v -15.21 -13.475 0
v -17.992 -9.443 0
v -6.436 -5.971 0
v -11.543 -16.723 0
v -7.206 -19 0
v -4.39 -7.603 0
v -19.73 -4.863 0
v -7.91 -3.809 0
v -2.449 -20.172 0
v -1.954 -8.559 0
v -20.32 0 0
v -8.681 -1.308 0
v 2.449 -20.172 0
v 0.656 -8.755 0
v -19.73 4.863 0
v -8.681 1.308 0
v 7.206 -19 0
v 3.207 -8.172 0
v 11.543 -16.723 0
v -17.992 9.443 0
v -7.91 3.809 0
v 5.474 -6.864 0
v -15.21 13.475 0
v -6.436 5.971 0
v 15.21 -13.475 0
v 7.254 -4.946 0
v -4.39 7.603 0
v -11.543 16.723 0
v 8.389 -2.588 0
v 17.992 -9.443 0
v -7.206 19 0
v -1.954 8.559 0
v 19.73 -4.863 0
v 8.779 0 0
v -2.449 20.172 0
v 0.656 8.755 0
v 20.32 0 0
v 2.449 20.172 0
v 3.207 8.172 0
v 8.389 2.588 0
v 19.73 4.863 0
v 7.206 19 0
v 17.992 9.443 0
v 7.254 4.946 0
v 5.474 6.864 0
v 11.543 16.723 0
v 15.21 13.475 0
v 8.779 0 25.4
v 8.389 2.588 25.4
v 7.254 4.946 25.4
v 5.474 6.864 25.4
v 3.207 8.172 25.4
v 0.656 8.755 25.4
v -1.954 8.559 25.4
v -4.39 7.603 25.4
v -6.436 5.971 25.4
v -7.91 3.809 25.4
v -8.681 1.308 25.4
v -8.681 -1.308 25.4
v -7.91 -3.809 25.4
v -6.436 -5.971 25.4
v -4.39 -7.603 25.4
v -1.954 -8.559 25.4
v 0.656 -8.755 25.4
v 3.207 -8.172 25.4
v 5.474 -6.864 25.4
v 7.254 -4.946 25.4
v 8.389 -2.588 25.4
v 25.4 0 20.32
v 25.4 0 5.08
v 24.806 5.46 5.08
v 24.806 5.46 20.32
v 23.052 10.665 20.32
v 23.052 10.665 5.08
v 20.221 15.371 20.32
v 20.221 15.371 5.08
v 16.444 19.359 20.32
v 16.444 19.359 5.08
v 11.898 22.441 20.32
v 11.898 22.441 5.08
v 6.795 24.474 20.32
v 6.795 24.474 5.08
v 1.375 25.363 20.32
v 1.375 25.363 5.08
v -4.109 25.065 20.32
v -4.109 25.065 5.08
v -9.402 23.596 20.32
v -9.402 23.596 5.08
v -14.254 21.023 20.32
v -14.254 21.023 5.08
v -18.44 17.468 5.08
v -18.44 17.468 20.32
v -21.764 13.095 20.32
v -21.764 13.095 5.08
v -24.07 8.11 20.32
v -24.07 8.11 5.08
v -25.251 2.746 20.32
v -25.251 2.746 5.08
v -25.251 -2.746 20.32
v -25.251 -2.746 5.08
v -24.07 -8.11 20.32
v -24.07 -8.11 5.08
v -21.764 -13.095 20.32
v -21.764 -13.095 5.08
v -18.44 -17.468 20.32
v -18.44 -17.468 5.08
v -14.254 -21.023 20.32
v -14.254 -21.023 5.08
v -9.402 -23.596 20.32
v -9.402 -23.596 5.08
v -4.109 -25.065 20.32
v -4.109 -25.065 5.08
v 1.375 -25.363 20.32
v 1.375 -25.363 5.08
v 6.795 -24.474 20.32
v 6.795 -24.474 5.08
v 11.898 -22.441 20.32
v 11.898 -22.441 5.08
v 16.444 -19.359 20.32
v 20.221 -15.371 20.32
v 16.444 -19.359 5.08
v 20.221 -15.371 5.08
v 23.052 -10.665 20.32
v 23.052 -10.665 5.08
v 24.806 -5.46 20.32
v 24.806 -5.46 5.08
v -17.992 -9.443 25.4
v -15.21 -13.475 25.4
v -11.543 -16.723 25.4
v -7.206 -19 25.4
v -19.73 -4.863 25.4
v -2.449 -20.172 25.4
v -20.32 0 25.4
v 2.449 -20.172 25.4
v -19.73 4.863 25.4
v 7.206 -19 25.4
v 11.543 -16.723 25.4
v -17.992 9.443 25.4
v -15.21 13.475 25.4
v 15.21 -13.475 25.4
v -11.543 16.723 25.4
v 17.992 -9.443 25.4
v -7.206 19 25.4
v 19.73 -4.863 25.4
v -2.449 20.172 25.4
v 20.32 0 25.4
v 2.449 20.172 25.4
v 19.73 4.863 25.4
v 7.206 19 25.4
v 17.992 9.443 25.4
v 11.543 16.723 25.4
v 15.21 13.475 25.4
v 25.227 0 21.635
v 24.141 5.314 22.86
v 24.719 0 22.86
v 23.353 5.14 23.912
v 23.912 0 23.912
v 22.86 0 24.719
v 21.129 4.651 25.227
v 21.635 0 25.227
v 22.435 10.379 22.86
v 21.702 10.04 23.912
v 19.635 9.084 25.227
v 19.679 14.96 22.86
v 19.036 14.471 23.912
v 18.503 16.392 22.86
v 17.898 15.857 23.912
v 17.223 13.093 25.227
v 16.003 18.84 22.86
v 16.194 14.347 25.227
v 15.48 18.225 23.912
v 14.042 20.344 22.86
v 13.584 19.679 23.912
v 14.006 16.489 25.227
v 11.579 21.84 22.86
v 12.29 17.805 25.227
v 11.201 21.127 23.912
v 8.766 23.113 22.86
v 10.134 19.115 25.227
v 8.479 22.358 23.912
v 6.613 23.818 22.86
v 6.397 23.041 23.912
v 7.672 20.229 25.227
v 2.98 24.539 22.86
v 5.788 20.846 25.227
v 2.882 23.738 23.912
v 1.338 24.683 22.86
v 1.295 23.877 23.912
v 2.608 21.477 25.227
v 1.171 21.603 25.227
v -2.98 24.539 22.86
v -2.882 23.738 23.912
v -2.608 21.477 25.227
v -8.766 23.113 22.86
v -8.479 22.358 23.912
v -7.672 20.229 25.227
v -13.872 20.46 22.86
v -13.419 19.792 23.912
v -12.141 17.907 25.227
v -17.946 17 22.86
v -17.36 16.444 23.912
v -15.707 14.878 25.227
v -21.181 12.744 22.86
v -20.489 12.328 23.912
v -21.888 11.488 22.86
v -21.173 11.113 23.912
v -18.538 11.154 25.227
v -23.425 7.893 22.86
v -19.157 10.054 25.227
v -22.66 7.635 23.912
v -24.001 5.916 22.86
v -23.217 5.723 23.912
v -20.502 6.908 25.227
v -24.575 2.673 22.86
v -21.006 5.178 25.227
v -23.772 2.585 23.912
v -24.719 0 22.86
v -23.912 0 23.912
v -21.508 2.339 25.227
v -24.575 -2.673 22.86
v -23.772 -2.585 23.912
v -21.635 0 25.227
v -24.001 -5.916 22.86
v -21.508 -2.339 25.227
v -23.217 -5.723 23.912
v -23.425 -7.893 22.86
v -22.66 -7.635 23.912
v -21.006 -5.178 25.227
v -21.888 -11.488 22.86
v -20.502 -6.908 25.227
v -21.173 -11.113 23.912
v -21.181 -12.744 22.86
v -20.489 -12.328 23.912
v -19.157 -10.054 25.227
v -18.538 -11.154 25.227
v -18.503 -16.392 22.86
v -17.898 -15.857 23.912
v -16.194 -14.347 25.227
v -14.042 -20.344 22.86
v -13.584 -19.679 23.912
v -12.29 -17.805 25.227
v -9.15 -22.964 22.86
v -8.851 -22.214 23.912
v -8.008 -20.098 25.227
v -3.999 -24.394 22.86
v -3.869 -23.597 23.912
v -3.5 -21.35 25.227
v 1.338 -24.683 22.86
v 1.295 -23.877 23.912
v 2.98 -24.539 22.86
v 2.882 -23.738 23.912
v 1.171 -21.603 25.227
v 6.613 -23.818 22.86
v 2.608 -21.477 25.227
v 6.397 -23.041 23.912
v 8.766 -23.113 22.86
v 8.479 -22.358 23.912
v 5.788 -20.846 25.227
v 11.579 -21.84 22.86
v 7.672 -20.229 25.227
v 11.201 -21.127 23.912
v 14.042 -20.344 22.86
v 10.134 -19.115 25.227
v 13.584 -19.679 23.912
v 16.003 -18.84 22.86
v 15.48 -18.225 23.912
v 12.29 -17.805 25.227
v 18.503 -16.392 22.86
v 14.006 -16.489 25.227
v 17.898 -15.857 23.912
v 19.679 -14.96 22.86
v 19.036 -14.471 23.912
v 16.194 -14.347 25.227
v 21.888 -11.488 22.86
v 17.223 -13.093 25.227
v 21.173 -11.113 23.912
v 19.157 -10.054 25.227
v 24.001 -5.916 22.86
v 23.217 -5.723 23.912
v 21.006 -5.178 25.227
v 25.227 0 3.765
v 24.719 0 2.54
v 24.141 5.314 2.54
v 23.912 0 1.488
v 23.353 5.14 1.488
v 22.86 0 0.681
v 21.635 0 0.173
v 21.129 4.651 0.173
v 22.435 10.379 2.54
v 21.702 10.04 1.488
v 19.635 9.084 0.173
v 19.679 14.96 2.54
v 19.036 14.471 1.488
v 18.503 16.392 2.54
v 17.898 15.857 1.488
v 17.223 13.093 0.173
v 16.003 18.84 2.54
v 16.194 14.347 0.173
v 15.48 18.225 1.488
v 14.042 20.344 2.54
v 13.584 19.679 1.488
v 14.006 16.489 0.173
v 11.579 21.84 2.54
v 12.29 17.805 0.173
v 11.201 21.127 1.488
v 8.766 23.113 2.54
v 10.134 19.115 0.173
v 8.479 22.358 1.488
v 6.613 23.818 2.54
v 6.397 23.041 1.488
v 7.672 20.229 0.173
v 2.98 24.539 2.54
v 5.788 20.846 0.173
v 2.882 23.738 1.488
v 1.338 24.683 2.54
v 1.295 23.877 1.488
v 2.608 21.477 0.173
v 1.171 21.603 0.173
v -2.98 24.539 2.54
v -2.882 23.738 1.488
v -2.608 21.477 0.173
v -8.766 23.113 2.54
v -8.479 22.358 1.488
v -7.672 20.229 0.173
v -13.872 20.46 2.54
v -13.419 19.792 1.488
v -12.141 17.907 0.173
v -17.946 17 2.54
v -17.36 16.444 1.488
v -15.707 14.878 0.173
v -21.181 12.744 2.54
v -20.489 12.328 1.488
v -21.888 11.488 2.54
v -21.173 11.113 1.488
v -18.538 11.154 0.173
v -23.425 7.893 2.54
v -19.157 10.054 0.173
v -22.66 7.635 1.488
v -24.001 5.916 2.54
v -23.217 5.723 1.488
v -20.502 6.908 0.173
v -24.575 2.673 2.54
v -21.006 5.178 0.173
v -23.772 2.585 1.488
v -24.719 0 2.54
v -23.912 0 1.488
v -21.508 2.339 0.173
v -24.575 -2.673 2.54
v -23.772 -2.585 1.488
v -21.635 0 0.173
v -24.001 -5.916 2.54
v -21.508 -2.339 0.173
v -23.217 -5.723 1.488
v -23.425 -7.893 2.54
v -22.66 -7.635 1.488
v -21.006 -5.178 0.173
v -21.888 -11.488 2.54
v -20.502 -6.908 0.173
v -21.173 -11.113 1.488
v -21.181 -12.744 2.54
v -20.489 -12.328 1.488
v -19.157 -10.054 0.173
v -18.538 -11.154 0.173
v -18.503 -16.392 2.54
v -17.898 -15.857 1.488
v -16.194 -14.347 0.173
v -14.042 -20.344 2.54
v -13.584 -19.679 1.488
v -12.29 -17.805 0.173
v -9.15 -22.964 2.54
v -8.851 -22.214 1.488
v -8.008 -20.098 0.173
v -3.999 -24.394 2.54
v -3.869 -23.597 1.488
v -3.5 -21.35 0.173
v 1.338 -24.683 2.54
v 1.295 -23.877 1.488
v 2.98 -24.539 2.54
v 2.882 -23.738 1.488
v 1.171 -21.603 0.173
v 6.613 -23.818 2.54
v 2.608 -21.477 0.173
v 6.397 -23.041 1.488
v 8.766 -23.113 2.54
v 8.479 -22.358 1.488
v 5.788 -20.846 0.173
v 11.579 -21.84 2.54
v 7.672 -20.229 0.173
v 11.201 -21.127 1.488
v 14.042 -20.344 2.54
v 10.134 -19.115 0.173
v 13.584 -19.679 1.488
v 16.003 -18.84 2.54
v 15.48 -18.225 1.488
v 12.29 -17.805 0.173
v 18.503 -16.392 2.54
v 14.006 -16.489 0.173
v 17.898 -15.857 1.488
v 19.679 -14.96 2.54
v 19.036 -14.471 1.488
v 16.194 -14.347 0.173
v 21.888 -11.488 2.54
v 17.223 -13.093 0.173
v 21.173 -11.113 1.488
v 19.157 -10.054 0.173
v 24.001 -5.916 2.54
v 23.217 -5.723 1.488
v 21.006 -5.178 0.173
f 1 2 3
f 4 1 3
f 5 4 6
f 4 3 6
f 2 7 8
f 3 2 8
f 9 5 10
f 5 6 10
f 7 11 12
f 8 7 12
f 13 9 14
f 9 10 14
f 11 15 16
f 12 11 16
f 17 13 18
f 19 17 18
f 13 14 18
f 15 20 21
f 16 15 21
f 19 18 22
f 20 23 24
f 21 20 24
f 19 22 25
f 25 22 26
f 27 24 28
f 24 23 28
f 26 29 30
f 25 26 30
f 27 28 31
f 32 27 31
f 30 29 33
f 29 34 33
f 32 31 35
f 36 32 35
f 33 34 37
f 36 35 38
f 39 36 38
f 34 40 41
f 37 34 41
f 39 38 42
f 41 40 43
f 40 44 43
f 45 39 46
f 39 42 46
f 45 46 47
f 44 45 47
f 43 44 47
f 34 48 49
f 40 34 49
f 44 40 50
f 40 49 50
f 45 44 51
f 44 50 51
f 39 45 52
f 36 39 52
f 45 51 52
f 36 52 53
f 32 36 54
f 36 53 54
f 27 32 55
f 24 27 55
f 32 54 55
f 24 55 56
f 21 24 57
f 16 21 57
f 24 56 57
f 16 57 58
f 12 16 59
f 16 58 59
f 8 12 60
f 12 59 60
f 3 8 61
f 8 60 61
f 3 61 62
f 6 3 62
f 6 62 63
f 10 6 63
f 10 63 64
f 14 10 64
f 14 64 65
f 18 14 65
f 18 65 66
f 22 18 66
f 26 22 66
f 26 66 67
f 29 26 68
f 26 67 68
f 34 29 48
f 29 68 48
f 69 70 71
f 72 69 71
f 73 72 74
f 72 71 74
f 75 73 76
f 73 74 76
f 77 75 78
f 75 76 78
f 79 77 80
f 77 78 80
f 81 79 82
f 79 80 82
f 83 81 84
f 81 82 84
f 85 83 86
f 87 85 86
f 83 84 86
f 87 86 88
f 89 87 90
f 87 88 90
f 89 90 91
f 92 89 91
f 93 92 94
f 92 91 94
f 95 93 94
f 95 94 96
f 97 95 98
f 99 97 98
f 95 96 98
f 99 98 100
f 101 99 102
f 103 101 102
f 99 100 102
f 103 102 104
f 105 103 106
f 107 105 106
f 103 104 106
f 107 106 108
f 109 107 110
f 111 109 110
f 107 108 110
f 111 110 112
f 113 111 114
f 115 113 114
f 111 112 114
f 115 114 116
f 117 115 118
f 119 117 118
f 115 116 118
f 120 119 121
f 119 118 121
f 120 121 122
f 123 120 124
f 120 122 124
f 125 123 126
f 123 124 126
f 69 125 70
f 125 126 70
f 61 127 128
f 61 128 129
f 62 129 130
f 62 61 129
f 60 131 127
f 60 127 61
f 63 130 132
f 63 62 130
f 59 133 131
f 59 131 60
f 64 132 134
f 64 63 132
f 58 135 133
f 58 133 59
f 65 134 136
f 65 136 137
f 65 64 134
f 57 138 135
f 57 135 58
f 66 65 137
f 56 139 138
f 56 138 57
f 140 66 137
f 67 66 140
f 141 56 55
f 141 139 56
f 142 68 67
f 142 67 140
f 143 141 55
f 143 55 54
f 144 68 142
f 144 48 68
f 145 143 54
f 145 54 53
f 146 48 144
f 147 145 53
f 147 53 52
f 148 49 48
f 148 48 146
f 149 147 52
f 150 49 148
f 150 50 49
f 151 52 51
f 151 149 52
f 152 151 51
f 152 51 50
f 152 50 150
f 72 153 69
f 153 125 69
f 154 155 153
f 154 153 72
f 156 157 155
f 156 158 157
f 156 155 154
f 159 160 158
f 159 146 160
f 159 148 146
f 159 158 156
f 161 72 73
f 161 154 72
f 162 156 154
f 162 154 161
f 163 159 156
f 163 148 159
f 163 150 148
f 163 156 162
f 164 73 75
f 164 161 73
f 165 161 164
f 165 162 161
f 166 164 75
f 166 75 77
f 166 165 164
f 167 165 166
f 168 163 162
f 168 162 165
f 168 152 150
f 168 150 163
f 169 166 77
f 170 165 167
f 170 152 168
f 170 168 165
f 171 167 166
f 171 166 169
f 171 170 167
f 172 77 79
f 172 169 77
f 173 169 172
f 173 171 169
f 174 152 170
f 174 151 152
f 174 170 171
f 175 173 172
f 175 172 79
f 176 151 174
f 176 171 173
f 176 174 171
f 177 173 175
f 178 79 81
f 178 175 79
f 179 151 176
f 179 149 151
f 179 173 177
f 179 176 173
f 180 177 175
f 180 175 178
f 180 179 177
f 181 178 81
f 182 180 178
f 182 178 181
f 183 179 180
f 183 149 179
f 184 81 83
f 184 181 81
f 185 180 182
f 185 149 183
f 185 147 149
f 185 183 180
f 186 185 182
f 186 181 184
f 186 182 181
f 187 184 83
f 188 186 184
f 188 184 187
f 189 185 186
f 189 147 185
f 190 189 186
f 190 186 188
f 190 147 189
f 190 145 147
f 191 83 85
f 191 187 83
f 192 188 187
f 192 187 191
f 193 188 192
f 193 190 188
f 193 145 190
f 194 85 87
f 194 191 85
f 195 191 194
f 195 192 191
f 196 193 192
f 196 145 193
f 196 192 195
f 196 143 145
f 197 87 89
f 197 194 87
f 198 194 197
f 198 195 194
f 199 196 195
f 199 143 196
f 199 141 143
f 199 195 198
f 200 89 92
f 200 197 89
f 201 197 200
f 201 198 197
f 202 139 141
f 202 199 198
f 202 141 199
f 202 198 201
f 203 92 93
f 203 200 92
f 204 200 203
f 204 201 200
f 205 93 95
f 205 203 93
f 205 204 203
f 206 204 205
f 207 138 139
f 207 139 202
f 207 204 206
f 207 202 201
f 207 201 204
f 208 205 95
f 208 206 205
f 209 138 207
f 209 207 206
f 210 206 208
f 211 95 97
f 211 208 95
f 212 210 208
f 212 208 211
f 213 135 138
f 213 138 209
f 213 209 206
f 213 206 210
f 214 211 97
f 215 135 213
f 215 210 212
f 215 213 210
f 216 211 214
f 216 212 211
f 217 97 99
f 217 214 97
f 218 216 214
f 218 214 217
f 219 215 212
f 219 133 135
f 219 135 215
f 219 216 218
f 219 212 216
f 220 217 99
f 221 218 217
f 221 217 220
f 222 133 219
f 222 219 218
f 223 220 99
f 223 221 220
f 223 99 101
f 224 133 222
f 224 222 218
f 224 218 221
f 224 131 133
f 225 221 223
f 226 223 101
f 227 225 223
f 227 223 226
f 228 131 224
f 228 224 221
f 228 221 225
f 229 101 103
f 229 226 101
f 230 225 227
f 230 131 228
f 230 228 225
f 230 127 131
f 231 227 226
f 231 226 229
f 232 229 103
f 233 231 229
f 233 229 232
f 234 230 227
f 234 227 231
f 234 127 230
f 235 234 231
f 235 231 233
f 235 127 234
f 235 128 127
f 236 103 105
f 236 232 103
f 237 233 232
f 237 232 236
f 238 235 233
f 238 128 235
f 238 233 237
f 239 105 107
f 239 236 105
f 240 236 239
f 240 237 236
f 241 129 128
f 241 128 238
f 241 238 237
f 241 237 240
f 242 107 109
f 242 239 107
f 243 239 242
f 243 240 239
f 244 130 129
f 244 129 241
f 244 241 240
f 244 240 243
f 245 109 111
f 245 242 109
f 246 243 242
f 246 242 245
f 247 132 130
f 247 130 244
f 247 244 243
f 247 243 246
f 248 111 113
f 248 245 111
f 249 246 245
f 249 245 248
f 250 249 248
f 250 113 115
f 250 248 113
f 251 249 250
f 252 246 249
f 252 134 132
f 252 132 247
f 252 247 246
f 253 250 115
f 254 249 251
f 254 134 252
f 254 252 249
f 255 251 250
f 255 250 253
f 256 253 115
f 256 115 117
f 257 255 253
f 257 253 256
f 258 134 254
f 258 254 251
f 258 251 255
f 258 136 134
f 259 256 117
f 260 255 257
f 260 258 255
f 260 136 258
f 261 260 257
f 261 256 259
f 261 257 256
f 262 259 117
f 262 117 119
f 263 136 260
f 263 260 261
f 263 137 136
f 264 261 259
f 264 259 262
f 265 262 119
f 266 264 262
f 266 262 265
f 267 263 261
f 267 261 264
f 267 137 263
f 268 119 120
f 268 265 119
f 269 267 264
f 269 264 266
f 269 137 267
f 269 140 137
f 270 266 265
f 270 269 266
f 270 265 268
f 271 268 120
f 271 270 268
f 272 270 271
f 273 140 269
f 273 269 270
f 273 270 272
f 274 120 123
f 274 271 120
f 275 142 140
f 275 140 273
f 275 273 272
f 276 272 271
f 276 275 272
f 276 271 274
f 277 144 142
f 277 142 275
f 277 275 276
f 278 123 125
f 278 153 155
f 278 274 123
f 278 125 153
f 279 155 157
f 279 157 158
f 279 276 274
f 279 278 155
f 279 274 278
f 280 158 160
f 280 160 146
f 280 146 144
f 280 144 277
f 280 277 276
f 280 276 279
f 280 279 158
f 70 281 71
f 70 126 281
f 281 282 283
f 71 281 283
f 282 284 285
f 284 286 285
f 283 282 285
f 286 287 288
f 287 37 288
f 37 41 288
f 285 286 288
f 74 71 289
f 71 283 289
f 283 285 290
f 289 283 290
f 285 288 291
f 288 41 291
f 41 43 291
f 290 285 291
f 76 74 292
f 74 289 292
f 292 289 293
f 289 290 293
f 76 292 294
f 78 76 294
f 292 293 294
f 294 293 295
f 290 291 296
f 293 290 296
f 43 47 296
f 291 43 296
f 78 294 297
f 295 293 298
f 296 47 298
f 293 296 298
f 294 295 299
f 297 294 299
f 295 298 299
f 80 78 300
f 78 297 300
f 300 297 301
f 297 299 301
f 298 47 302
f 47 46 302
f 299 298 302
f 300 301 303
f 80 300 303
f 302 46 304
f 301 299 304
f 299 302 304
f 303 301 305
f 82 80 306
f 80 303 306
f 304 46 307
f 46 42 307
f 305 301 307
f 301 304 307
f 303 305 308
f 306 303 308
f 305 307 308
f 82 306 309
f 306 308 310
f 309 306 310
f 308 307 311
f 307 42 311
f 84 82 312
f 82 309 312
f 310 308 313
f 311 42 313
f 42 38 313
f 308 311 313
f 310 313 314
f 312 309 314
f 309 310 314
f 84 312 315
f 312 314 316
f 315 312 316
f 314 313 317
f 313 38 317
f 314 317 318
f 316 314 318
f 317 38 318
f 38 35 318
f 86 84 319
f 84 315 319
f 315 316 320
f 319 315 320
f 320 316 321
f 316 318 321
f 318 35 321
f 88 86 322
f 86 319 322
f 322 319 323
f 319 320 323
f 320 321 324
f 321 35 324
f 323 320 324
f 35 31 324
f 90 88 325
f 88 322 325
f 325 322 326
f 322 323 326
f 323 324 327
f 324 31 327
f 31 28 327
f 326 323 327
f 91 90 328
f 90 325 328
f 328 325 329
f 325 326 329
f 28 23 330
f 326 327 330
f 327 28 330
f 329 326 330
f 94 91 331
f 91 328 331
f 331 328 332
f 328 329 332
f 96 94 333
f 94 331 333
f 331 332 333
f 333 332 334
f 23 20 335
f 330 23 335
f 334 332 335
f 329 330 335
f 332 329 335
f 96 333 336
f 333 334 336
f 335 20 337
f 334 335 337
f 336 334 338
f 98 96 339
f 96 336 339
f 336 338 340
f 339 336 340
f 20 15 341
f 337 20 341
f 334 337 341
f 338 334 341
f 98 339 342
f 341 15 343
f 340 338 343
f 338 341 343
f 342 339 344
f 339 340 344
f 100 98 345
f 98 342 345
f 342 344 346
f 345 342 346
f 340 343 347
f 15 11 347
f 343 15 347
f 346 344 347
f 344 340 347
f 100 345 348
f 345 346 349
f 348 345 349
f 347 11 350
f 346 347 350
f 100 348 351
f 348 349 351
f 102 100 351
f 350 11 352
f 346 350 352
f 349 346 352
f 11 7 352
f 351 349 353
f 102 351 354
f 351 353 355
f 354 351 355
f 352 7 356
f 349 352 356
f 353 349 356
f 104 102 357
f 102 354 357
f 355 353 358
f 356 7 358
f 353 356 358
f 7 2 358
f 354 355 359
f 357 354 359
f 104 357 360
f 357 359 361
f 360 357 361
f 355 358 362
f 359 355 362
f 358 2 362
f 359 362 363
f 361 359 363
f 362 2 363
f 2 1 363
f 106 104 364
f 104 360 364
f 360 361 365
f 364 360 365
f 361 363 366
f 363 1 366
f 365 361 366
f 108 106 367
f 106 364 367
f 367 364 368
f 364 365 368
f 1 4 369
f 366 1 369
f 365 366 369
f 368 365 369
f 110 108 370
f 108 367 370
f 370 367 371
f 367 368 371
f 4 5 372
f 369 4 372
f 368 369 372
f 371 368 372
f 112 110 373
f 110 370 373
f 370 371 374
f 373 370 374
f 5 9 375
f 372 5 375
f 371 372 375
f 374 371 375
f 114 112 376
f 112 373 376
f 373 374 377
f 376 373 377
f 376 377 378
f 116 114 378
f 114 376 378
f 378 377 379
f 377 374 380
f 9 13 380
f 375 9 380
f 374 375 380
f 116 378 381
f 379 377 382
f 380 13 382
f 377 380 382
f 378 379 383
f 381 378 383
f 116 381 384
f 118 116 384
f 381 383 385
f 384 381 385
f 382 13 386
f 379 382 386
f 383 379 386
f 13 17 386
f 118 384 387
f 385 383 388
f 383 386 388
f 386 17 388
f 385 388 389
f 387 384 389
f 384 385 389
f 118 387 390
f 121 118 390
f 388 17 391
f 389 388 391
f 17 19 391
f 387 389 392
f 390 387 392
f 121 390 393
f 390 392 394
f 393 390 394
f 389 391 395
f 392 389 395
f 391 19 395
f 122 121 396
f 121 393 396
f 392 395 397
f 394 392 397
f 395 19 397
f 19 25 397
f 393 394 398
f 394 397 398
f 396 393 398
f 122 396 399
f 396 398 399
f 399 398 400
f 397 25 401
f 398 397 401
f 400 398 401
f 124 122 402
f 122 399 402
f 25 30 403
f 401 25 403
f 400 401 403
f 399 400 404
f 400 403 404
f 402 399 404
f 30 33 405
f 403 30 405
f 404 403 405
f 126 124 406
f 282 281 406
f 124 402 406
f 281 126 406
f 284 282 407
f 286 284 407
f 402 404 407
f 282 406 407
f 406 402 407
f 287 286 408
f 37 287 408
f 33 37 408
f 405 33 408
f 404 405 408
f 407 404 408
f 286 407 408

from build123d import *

# Parameters (mm, degrees)
F0_R     = 25.4
F1_DEPTH = 25.4
F2_R     = 8.779275
F3_DEPTH = 25.4
F4_R     = 5.08
F5_R     = 5.08


with BuildPart() as f1:
    # F0 (on Top) → F1 (new body)
    with BuildSketch(Plane.XY):
        Circle(F0_R)
    extrude(amount=F1_DEPTH)

    # F2 (on face) → F3 (cut)
    with BuildSketch(Plane.XY.offset(25.4)):
        Circle(F2_R)
    extrude(amount=-F3_DEPTH, mode=Mode.SUBTRACT)

    # F4
    f4_edges = [f1.edges().sort_by_distance(p)[0] for p in [
        (-25.4, 0, 25.4),
    ]]
    fillet(f4_edges, radius=F4_R)

    # F5
    f5_edges = [f1.edges().sort_by_distance(p)[0] for p in [
        (-25.4, 0, 0),
    ]]
    fillet(f5_edges, radius=F5_R)


solid = f1.part
